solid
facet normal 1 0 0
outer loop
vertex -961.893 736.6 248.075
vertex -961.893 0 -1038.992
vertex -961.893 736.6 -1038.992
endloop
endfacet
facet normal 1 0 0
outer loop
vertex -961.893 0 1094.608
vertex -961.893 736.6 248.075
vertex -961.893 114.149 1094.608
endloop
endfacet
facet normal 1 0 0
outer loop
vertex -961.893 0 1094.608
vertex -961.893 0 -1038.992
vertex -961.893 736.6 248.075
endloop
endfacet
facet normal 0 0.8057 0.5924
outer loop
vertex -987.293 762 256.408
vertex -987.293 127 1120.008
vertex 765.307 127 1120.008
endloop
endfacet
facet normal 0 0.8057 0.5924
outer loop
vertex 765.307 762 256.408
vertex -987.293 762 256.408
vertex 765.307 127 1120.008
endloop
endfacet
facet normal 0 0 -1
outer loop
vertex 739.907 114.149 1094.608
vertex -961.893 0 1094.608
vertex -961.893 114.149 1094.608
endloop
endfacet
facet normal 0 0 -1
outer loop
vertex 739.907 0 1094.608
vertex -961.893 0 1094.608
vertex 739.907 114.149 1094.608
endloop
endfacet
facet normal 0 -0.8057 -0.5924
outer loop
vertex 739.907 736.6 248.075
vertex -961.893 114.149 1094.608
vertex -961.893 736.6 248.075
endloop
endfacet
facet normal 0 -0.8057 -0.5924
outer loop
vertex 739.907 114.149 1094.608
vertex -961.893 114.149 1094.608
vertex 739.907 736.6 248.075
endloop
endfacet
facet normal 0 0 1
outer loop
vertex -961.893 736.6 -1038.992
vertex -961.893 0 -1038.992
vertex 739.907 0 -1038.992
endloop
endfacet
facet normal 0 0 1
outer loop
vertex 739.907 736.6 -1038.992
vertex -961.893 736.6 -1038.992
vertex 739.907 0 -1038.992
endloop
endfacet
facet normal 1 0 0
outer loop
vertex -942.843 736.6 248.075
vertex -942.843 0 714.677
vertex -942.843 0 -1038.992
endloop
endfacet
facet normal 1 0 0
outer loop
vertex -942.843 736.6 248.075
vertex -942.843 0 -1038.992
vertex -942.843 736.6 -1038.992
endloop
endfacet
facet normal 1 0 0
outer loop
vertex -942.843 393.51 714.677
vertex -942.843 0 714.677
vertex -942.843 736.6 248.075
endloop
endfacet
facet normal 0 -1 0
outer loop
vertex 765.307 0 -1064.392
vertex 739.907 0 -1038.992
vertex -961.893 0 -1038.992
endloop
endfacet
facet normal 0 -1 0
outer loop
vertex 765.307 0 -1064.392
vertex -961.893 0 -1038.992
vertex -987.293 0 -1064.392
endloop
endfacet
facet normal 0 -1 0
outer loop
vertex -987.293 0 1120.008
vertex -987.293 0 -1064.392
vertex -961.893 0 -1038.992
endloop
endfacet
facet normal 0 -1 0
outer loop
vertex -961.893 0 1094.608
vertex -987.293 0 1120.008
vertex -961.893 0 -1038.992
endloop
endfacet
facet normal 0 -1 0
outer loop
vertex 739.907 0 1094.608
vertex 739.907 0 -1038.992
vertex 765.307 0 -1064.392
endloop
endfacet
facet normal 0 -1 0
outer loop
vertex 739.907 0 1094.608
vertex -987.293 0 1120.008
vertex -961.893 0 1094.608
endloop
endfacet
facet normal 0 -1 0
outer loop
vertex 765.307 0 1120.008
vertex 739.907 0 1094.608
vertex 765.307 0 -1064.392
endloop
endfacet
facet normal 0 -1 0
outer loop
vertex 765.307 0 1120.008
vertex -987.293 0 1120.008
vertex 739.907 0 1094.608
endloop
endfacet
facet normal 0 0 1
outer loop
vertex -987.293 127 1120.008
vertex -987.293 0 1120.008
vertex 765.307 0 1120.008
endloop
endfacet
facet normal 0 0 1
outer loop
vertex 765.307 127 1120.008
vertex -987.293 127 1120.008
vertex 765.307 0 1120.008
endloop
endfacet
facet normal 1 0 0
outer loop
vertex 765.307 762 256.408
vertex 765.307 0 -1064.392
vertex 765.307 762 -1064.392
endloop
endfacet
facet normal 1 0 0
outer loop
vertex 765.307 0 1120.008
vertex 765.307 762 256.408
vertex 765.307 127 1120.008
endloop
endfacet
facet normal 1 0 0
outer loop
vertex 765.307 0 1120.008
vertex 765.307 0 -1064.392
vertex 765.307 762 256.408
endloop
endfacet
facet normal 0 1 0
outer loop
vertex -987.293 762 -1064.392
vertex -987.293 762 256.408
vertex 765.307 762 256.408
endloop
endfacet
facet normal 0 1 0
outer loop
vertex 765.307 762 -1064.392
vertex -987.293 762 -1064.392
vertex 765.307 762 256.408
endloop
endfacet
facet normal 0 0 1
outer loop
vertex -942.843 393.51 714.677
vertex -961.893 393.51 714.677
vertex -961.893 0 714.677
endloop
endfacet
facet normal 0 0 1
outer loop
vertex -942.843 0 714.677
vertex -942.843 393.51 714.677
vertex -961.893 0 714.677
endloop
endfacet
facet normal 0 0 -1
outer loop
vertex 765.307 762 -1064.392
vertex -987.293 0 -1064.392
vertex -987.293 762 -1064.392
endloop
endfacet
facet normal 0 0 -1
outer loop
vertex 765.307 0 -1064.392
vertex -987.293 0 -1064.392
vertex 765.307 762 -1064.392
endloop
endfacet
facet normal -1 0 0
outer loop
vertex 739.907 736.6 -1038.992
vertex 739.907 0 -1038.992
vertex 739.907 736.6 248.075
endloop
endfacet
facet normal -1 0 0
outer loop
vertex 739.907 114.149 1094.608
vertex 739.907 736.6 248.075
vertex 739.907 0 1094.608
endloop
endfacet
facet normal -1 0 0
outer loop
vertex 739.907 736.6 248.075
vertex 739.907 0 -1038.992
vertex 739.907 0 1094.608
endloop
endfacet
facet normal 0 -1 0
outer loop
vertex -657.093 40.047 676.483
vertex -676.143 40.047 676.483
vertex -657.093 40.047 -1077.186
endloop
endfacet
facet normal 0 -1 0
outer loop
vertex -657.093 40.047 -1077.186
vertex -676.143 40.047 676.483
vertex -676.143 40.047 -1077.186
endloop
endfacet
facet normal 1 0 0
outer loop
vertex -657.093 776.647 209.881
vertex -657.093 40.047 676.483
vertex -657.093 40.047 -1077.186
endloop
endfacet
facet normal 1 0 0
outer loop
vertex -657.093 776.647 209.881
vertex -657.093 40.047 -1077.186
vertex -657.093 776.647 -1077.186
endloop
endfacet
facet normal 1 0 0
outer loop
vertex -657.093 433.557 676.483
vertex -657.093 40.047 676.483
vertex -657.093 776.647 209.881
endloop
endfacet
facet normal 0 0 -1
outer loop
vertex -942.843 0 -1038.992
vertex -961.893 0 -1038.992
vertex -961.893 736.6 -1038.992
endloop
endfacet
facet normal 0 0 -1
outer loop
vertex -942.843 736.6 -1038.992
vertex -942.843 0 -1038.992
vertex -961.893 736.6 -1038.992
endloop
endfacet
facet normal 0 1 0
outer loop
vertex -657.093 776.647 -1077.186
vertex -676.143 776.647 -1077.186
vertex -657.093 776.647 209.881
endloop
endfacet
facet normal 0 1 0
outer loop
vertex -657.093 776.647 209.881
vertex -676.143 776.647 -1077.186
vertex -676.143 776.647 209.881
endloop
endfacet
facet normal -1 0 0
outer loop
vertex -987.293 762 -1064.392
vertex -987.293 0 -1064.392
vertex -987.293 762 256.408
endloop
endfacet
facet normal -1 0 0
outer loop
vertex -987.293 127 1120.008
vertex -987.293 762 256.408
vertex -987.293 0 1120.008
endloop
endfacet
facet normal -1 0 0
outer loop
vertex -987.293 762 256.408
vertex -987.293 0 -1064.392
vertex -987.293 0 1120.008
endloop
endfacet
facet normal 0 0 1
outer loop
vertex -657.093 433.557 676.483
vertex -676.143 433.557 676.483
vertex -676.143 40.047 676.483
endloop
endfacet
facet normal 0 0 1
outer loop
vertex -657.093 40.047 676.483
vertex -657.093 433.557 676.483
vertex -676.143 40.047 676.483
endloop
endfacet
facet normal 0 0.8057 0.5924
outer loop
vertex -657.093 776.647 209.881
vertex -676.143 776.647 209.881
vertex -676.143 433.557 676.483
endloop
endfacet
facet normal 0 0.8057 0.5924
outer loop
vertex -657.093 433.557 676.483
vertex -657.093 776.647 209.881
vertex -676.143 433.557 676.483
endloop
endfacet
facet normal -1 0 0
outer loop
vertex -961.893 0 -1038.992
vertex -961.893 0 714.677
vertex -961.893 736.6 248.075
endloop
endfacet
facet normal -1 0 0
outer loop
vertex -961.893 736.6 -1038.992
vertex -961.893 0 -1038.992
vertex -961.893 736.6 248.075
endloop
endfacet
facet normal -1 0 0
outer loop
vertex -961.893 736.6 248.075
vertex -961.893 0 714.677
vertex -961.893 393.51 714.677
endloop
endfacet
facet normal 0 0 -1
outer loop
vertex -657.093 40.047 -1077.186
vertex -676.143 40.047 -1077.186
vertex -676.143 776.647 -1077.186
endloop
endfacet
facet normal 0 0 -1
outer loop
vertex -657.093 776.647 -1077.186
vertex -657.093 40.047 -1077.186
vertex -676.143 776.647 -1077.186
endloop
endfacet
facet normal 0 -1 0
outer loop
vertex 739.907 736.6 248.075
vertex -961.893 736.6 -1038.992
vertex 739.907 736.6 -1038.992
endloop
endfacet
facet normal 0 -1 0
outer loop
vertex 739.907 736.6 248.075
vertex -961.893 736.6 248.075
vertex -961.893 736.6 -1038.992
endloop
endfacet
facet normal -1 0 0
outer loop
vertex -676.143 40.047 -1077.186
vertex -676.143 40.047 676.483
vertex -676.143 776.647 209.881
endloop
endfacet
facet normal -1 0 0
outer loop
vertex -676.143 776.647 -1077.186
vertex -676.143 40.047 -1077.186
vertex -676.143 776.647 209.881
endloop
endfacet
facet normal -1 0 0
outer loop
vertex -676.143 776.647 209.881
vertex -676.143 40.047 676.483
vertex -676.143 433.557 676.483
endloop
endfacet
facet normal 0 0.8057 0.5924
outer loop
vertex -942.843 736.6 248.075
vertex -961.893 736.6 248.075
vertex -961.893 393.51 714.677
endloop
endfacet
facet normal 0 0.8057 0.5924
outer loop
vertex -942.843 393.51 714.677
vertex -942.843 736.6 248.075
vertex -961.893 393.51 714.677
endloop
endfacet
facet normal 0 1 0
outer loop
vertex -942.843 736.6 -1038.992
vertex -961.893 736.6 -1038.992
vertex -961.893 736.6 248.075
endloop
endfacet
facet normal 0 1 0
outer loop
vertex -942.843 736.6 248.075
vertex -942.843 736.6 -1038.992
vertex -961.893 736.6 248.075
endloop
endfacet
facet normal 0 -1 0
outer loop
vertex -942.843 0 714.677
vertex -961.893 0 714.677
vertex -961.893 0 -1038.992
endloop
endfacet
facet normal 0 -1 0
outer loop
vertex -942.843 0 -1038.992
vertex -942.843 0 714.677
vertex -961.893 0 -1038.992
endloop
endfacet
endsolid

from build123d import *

# Parameters (mm, degrees)
F0_W     = 1752.6
F0_H     = 2184.4
F1_DEPTH = 762
F2_SIZE2 = 635
F2_SIZE  = 863.6
F3_T     = -25.4
F5_DEPTH = 19.05
F8_DEPTH = 19.05


with BuildPart() as f1:
    # F0 (on Front) → F1 (new body)
    with BuildSketch(Plane.XZ):
        with Locations((-110.9929393764, 27.8082511663)):
            Rectangle(F0_W, F0_H)
    extrude(amount=-F1_DEPTH)

    # F2
    f2_edges = [f1.edges().sort_by_distance(p)[0] for p in [
        (-110.992939, 762, 1120.008251),
    ]]
    f2_side = f1.faces().sort_by_distance((-110.992939, 762, 27.808251))[0]
    chamfer(f2_edges, length=F2_SIZE, length2=F2_SIZE2, reference=f2_side)

    # F3
    f3_openings = [f1.faces().sort_by_distance(p)[0] for p in [
        (-110.992939, 0, 27.808251),
    ]]
    offset(amount=F3_T, openings=f3_openings)


with BuildPart() as f5:
    # F4 (on face) → F5 (new body)
    with BuildSketch(Plane.YZ.offset(-961.8929393764)):
        Polygon((736.6, -1038.9917488337), (736.6, 248.0751251433), (393.5104036319, 714.6769762039), (0, 714.6769762039), (0, -1038.9917488337), align=None)
    extrude(amount=F5_DEPTH)


with BuildPart() as f8:
    # F7 (on offset) → F8 (new body)
    with BuildSketch(Plane.YZ.offset(-676.1429393764)):
        Polygon((776.6470954039, -1077.1855942721), (776.6470954039, 209.8812797048), (433.5574990358, 676.4831307655), (40.0470954039, 676.4831307655), (40.0470954039, -1077.1855942721), align=None)
    extrude(amount=F8_DEPTH)


solid = Compound([f1.part, f5.part, f8.part])
